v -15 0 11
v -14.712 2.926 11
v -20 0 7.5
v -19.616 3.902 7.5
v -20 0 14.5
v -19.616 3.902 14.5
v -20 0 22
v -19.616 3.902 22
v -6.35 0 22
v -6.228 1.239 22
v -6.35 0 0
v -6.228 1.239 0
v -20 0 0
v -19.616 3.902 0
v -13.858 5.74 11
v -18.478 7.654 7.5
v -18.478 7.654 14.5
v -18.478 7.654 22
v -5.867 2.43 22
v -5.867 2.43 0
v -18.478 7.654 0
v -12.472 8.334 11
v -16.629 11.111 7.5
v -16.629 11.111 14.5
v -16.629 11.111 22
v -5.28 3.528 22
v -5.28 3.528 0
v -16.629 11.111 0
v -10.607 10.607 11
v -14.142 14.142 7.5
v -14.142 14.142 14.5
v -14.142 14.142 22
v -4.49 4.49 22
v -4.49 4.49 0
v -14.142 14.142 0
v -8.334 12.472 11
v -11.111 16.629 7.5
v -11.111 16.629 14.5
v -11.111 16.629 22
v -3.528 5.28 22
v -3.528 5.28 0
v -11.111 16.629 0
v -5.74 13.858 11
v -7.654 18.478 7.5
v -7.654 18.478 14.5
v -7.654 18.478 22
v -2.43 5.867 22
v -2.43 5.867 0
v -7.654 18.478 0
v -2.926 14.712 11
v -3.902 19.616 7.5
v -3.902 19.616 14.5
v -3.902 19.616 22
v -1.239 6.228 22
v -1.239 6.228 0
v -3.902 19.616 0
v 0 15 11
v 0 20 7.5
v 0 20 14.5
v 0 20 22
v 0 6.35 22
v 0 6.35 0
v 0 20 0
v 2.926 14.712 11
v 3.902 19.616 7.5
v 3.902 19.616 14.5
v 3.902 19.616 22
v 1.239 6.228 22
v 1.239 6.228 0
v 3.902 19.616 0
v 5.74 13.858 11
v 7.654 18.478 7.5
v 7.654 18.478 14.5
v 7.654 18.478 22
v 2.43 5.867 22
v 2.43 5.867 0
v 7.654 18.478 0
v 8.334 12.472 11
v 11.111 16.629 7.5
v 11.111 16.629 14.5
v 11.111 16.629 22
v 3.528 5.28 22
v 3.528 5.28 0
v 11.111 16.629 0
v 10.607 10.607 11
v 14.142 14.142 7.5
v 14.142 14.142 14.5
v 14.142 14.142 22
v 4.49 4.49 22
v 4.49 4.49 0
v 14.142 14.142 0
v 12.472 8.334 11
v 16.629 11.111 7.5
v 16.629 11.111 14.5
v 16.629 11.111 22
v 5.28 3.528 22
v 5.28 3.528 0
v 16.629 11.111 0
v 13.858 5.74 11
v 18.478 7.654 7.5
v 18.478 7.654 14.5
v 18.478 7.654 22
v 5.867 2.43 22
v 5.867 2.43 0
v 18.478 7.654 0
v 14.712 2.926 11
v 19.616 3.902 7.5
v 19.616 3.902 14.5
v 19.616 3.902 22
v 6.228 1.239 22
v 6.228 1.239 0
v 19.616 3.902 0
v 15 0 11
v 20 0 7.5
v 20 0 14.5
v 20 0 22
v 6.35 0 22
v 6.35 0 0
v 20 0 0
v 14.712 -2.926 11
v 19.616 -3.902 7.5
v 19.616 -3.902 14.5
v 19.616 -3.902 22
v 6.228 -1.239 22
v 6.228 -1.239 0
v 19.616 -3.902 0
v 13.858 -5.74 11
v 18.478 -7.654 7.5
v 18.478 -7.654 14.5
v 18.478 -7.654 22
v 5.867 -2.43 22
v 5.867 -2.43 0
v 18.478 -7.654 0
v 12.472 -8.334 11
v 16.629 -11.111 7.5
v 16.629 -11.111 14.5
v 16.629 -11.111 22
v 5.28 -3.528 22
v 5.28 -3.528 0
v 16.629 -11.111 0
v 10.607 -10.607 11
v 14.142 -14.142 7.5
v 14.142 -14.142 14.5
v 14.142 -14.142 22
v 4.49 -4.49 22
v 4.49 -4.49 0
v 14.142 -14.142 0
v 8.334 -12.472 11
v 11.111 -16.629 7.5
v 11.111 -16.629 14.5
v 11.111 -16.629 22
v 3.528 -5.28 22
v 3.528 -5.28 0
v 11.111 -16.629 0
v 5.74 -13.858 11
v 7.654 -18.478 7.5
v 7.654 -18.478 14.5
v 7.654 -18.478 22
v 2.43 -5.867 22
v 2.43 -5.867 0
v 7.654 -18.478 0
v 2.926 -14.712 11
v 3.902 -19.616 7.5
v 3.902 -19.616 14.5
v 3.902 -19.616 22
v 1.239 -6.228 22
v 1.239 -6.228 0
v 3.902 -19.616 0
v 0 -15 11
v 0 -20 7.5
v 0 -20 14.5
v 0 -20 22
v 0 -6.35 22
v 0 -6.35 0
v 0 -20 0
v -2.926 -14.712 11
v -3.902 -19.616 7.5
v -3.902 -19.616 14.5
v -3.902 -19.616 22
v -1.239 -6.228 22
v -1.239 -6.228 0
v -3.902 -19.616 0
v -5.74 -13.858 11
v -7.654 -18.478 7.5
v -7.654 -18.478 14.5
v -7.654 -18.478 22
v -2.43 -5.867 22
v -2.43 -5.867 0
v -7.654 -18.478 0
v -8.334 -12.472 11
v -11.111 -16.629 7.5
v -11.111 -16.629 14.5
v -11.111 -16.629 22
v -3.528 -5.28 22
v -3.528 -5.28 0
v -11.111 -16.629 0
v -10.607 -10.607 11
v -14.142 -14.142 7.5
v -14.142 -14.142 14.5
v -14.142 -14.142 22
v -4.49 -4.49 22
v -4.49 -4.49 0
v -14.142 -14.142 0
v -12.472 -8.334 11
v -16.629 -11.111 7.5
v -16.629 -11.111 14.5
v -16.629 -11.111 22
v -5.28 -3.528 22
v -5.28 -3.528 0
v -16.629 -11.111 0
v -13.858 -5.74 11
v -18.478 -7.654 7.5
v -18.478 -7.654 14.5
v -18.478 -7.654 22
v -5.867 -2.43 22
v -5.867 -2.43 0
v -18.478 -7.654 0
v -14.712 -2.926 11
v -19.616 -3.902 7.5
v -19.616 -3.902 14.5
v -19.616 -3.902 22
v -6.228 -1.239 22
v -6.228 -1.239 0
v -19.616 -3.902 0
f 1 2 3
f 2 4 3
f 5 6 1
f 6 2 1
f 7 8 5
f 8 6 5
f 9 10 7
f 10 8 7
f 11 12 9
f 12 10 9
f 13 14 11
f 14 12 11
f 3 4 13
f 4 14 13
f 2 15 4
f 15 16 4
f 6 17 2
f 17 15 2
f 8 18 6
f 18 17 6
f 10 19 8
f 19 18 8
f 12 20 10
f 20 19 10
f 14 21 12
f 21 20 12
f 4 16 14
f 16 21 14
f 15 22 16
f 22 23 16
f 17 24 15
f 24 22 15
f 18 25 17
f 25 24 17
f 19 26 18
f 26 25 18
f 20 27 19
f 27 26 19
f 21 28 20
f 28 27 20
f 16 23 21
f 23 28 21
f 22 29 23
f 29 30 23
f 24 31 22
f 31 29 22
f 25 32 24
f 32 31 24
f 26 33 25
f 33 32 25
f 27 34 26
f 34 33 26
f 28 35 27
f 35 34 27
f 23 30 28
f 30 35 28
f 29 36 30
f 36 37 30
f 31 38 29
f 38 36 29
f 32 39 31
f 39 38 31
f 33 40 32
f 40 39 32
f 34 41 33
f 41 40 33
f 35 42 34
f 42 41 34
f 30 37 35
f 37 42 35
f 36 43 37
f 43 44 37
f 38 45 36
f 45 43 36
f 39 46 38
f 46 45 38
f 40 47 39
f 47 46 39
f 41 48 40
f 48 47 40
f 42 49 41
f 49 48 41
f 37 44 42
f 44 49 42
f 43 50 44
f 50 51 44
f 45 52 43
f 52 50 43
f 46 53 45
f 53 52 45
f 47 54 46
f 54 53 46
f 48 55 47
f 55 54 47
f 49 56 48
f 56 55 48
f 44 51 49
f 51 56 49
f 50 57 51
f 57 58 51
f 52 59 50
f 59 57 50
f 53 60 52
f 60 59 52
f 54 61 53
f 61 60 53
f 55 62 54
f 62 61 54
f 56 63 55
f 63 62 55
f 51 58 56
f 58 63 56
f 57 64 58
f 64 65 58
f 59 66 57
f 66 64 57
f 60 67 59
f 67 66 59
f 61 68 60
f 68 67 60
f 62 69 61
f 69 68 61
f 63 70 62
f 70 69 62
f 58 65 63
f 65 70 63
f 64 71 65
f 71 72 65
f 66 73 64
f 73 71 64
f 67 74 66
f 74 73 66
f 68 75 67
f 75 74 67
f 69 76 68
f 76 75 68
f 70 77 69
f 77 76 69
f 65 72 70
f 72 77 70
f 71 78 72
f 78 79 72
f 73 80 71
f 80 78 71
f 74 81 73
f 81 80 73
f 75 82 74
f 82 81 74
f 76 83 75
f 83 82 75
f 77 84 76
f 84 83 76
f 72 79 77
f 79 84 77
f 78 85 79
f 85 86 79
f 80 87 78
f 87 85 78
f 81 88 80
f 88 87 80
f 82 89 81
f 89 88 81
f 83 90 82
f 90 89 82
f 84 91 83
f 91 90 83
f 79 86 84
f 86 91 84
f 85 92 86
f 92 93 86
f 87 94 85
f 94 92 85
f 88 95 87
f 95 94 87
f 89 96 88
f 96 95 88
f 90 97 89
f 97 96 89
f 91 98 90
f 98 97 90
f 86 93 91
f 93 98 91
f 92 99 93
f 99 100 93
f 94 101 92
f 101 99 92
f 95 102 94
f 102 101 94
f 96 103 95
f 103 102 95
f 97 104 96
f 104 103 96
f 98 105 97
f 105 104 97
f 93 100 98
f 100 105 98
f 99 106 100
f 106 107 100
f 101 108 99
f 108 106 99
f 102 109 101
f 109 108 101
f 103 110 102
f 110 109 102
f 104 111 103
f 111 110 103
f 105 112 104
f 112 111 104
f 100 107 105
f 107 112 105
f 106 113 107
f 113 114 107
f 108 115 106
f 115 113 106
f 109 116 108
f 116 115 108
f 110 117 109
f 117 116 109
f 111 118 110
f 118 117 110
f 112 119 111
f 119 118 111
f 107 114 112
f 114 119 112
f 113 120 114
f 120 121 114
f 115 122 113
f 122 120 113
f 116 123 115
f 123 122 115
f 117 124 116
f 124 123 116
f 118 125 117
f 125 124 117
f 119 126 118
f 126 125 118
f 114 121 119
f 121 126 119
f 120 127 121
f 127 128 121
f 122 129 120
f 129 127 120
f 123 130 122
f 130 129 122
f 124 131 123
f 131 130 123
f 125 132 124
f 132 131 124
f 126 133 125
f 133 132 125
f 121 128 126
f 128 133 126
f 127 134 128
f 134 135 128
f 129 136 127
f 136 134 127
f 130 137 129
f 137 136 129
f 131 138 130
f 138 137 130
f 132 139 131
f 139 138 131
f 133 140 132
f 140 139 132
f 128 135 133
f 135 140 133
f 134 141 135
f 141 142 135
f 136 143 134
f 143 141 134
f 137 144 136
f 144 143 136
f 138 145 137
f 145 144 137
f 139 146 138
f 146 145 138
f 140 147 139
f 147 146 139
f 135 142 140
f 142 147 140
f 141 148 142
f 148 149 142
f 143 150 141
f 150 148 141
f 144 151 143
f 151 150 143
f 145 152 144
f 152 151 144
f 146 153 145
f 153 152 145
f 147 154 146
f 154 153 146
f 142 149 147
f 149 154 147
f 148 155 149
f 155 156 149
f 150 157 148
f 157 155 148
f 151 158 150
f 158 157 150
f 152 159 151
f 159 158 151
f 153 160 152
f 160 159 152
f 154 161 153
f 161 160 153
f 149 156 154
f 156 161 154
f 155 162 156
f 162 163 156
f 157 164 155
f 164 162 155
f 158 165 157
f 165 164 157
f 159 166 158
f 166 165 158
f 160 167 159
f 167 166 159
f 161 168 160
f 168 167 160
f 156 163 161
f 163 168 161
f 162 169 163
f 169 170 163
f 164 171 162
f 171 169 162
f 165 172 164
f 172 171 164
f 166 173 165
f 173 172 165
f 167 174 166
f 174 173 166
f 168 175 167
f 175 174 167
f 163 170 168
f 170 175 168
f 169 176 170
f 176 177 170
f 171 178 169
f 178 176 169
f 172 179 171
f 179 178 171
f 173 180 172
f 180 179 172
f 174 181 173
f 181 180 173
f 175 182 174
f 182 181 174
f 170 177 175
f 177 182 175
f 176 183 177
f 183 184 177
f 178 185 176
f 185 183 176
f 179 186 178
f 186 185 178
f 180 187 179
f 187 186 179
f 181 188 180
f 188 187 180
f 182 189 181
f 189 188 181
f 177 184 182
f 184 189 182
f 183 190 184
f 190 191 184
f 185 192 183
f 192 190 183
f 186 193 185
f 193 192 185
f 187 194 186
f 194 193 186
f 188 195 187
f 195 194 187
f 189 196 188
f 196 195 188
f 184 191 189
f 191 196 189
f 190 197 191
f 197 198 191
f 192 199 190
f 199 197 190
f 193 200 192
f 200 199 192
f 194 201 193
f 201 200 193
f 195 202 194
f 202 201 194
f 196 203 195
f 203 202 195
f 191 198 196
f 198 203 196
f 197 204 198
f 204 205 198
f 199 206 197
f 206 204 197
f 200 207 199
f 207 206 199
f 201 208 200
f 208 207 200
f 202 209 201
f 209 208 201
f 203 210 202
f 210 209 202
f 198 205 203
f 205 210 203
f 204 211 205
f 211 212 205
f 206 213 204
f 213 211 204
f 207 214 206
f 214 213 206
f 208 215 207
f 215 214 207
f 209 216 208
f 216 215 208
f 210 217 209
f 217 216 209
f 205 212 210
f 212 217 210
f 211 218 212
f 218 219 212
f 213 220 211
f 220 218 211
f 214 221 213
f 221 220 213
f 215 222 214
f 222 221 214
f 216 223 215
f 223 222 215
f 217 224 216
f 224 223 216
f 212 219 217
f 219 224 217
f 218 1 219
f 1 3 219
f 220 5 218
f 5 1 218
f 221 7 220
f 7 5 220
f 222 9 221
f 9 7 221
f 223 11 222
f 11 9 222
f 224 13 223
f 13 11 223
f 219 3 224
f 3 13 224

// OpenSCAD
$fn = 32;

// ----------------------------------------------------------------------
// Belt roller: 40 mm barrel, 22 mm wide, bore 12.7 mm
// ----------------------------------------------------------------------

// --- parameters (mm) ---
bore_d = 12.7;            // bore
barrel_d = 40;            // barrel diameter
roller_w = 22;            // roller width
groove_w = 7;             // guide groove width
groove_d = 5;             // guide groove depth

roller_profile = [[6.35, 0], [20, 0], [20, 7.5], [15, 11], [20, 14.5], [20, 22], [6.35, 22]];

/* the profile stays clear of the axis, so the bore comes out of the revolve */
rotate_extrude() polygon(roller_profile);
